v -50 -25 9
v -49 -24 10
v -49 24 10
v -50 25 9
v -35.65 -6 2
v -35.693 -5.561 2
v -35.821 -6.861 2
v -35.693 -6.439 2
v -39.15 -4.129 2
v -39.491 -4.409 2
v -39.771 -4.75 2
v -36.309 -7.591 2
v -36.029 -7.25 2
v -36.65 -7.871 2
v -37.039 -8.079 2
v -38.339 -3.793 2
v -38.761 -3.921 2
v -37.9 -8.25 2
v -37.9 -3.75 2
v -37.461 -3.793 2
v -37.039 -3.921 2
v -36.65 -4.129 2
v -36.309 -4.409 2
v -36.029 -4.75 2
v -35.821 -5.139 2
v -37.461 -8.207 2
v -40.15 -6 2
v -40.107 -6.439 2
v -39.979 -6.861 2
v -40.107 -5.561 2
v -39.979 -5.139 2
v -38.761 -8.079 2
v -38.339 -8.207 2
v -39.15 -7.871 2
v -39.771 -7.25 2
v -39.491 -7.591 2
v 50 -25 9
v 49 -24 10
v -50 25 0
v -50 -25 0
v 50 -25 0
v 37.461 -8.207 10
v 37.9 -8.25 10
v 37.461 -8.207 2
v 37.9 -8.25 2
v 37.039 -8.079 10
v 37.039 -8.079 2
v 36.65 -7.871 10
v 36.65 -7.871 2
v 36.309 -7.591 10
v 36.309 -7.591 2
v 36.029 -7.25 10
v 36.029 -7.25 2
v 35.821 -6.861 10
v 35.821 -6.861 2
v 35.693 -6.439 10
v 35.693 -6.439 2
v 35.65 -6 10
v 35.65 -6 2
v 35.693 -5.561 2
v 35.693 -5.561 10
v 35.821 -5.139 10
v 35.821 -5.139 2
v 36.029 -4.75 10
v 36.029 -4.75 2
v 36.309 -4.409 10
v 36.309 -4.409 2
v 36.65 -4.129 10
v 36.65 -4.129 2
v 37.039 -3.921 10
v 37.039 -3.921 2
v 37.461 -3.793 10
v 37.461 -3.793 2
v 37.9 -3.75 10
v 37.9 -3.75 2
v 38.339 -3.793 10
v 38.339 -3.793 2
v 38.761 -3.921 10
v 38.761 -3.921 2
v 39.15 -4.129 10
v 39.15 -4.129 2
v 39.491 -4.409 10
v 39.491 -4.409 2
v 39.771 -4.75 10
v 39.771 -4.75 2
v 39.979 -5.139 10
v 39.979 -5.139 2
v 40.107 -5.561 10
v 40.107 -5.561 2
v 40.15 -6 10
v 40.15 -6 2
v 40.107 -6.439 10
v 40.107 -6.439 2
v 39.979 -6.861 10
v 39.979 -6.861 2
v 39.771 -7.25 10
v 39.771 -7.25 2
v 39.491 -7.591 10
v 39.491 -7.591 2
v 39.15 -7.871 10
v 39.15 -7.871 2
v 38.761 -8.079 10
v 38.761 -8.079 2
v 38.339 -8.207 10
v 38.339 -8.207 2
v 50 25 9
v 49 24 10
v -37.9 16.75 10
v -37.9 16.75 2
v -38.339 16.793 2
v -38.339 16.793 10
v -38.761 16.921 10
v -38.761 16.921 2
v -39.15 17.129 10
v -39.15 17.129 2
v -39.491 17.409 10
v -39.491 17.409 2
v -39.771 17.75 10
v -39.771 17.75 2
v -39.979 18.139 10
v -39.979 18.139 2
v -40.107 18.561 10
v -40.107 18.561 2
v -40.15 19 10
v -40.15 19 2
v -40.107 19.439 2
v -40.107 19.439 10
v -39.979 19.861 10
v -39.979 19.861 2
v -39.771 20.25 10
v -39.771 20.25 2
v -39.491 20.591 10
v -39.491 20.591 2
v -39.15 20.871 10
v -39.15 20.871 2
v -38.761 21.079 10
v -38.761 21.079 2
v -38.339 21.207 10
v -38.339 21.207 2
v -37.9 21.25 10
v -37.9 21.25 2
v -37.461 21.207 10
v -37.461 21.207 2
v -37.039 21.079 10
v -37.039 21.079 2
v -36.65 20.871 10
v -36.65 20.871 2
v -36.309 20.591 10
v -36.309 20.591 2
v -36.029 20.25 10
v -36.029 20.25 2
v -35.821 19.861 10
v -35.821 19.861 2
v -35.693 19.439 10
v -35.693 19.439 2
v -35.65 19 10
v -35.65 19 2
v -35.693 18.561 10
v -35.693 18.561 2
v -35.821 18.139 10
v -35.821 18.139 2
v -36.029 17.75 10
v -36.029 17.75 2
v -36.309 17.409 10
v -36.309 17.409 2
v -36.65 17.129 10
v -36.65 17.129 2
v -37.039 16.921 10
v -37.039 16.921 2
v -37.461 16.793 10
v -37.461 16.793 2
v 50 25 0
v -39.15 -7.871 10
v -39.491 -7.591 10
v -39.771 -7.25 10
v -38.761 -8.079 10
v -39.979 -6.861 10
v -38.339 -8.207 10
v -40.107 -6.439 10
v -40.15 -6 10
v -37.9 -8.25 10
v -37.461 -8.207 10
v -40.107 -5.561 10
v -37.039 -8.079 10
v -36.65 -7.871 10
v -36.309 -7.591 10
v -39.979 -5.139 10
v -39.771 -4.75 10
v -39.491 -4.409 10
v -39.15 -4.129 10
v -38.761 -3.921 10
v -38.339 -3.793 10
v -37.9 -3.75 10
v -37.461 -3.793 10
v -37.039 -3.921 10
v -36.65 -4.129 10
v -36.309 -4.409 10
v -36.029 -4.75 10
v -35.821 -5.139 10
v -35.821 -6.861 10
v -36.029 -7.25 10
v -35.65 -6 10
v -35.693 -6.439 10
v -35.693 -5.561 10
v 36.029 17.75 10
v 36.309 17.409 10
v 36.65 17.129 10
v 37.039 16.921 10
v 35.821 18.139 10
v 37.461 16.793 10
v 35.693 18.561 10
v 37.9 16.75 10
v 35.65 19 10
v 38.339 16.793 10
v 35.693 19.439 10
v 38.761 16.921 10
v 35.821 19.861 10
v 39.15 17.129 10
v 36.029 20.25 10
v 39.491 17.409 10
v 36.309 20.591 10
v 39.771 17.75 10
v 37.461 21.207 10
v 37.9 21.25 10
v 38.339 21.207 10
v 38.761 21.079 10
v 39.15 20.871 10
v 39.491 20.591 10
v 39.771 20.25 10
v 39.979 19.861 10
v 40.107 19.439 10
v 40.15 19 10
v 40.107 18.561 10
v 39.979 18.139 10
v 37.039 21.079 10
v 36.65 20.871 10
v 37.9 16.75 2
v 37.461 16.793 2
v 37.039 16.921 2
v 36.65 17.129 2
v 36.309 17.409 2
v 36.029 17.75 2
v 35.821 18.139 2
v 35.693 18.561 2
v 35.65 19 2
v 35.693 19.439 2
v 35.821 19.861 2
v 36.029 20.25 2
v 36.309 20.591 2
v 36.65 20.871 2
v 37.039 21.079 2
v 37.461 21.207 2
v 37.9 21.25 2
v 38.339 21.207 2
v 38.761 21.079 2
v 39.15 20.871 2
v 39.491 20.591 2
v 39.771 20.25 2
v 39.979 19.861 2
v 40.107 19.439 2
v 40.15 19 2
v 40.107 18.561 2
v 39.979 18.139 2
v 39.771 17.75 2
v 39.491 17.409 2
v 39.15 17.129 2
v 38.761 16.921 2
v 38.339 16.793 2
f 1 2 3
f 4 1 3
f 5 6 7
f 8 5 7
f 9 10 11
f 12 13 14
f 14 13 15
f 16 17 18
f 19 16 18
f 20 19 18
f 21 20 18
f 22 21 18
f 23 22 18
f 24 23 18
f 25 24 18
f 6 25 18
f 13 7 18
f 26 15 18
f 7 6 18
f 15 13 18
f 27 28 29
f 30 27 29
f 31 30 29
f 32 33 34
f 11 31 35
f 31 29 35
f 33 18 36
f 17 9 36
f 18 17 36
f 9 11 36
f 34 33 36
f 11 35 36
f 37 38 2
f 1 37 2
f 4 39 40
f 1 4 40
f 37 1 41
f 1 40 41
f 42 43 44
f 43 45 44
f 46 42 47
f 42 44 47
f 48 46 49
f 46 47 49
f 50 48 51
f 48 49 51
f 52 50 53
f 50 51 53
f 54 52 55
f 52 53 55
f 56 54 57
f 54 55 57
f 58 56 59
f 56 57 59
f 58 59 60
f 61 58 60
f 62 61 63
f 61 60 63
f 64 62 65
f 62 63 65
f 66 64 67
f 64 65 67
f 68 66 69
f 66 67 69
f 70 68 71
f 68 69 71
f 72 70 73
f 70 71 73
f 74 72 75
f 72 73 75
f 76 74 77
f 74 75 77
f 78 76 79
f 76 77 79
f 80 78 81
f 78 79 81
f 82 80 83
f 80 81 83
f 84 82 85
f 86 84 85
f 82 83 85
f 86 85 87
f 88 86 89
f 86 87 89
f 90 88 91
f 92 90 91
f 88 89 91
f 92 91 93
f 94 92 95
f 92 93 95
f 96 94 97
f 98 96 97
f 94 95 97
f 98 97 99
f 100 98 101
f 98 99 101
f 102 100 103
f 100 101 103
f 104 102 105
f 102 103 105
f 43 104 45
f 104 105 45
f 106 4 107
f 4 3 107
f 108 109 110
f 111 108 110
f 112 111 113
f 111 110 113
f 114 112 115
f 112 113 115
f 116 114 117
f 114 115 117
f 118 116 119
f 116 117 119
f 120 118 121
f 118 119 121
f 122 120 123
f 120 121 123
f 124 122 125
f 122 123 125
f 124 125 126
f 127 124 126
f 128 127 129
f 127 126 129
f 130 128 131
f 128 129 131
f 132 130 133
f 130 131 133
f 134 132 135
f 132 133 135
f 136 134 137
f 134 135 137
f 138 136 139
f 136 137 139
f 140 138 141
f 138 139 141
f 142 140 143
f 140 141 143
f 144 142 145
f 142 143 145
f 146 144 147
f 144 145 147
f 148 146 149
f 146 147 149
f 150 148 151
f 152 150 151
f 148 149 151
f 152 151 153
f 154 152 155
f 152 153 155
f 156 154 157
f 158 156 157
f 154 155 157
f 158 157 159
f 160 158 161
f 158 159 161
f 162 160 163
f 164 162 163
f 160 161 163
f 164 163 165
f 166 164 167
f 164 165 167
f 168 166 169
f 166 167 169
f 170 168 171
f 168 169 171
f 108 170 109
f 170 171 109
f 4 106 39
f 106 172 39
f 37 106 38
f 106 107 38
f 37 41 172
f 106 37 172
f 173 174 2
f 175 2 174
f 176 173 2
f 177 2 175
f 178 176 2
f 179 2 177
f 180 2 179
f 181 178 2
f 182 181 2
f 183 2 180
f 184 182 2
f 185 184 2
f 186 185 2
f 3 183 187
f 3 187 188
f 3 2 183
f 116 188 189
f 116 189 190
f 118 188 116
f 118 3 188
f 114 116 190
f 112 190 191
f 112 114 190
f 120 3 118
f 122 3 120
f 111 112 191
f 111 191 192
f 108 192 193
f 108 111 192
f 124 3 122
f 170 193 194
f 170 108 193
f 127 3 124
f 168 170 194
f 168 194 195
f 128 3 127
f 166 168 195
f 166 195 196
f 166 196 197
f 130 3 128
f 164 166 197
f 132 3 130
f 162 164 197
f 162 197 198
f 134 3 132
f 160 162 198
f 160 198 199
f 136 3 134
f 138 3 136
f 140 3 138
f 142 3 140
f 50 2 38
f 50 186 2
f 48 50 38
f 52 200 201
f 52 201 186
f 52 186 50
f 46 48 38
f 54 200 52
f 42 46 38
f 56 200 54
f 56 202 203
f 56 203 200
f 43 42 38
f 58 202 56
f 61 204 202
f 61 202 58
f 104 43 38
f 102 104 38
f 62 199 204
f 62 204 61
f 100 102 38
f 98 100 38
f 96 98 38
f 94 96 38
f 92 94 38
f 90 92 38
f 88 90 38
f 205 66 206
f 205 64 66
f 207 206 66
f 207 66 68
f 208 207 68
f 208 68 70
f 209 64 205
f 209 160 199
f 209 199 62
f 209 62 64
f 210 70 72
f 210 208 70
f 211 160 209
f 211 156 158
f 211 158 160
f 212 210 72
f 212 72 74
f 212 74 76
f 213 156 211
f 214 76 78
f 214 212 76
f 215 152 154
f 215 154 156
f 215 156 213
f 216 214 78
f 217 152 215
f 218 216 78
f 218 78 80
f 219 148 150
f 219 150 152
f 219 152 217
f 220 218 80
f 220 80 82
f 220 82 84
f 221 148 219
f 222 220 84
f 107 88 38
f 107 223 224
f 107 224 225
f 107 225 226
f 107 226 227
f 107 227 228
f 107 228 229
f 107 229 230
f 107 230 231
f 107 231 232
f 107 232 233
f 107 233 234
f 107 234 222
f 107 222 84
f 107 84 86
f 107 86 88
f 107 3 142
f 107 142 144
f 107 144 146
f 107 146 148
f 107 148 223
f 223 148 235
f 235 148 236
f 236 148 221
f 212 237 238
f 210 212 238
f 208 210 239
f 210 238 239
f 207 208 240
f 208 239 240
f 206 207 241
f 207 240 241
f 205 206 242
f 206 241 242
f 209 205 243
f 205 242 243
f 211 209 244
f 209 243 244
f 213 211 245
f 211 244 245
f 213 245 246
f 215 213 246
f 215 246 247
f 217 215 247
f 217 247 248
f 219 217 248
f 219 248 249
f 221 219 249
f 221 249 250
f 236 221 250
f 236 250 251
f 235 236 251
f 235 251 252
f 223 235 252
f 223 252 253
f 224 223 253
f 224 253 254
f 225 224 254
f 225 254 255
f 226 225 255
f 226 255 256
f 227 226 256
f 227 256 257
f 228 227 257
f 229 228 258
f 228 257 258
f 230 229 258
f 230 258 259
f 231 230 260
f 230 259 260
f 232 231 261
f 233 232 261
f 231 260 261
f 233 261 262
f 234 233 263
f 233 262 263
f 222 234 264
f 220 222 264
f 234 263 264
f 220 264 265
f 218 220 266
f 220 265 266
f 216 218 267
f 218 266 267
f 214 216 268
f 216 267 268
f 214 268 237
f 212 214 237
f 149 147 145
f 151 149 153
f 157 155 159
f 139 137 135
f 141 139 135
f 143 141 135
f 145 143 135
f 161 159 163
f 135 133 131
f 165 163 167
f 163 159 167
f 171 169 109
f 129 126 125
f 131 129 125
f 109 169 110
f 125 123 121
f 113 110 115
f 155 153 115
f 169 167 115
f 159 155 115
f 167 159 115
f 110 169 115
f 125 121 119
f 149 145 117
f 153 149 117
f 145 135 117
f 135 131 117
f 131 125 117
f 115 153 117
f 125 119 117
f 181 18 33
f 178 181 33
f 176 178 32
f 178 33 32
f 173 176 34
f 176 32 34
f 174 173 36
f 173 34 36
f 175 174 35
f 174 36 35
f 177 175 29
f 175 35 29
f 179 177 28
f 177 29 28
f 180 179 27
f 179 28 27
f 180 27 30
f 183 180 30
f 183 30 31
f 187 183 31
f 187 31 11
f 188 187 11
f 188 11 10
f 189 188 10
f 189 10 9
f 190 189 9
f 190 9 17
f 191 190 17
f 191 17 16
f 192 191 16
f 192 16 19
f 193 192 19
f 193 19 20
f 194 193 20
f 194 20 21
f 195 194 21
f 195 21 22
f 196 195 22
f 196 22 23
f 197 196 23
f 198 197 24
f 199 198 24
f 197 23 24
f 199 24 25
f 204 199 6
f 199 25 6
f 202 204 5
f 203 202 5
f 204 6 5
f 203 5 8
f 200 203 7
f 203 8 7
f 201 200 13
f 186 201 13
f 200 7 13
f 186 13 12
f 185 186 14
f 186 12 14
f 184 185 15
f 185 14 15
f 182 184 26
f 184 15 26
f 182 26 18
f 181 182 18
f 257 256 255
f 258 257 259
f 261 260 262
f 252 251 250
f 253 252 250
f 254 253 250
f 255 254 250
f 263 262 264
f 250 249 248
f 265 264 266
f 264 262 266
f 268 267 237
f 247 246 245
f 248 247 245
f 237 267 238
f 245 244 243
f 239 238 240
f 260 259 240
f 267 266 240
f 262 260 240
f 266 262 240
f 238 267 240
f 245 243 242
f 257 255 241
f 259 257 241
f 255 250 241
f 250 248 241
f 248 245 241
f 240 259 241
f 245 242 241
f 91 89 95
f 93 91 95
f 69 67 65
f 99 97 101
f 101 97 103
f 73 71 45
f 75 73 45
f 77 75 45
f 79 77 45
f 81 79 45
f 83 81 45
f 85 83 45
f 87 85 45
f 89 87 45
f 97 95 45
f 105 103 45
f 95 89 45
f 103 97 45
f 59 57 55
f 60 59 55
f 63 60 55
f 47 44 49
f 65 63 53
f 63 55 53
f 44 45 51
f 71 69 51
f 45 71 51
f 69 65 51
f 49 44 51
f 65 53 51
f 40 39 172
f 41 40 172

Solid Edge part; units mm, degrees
sketch "Sketch1" plane through (0, 0, 0) normal (0, 0, 1) x (1, 0, 0)
  line L0 (-50, -25) -> (50, -25)
  line L1 (50, -25) -> (50, 25)
  line L2 (50, 25) -> (-50, 25)
  line L3 (-50, 25) -> (-50, -25)
extrude "Protrusion1" add sketch "Sketch1" along normal blind 10
chamfer "Fase" distance 1 angle 45 4 edges at (0, -25, 10) (50, 0, 10) (0, 25, 10) (-50, 0, 10)
hole "Hole1" at (37.9, 19, 10) direction (0, 0, -1) diameter 4.5 depth 8
hole "Hole2" at (37.9, -6, 10) direction (0, 0, -1) diameter 4.5 depth 8
hole "Hole3" at (-37.9, -6, 10) direction (0, 0, -1) diameter 4.5 depth 8
hole "Hole4" at (-37.9, 19, 10) direction (0, 0, -1) diameter 4.5 depth 8
